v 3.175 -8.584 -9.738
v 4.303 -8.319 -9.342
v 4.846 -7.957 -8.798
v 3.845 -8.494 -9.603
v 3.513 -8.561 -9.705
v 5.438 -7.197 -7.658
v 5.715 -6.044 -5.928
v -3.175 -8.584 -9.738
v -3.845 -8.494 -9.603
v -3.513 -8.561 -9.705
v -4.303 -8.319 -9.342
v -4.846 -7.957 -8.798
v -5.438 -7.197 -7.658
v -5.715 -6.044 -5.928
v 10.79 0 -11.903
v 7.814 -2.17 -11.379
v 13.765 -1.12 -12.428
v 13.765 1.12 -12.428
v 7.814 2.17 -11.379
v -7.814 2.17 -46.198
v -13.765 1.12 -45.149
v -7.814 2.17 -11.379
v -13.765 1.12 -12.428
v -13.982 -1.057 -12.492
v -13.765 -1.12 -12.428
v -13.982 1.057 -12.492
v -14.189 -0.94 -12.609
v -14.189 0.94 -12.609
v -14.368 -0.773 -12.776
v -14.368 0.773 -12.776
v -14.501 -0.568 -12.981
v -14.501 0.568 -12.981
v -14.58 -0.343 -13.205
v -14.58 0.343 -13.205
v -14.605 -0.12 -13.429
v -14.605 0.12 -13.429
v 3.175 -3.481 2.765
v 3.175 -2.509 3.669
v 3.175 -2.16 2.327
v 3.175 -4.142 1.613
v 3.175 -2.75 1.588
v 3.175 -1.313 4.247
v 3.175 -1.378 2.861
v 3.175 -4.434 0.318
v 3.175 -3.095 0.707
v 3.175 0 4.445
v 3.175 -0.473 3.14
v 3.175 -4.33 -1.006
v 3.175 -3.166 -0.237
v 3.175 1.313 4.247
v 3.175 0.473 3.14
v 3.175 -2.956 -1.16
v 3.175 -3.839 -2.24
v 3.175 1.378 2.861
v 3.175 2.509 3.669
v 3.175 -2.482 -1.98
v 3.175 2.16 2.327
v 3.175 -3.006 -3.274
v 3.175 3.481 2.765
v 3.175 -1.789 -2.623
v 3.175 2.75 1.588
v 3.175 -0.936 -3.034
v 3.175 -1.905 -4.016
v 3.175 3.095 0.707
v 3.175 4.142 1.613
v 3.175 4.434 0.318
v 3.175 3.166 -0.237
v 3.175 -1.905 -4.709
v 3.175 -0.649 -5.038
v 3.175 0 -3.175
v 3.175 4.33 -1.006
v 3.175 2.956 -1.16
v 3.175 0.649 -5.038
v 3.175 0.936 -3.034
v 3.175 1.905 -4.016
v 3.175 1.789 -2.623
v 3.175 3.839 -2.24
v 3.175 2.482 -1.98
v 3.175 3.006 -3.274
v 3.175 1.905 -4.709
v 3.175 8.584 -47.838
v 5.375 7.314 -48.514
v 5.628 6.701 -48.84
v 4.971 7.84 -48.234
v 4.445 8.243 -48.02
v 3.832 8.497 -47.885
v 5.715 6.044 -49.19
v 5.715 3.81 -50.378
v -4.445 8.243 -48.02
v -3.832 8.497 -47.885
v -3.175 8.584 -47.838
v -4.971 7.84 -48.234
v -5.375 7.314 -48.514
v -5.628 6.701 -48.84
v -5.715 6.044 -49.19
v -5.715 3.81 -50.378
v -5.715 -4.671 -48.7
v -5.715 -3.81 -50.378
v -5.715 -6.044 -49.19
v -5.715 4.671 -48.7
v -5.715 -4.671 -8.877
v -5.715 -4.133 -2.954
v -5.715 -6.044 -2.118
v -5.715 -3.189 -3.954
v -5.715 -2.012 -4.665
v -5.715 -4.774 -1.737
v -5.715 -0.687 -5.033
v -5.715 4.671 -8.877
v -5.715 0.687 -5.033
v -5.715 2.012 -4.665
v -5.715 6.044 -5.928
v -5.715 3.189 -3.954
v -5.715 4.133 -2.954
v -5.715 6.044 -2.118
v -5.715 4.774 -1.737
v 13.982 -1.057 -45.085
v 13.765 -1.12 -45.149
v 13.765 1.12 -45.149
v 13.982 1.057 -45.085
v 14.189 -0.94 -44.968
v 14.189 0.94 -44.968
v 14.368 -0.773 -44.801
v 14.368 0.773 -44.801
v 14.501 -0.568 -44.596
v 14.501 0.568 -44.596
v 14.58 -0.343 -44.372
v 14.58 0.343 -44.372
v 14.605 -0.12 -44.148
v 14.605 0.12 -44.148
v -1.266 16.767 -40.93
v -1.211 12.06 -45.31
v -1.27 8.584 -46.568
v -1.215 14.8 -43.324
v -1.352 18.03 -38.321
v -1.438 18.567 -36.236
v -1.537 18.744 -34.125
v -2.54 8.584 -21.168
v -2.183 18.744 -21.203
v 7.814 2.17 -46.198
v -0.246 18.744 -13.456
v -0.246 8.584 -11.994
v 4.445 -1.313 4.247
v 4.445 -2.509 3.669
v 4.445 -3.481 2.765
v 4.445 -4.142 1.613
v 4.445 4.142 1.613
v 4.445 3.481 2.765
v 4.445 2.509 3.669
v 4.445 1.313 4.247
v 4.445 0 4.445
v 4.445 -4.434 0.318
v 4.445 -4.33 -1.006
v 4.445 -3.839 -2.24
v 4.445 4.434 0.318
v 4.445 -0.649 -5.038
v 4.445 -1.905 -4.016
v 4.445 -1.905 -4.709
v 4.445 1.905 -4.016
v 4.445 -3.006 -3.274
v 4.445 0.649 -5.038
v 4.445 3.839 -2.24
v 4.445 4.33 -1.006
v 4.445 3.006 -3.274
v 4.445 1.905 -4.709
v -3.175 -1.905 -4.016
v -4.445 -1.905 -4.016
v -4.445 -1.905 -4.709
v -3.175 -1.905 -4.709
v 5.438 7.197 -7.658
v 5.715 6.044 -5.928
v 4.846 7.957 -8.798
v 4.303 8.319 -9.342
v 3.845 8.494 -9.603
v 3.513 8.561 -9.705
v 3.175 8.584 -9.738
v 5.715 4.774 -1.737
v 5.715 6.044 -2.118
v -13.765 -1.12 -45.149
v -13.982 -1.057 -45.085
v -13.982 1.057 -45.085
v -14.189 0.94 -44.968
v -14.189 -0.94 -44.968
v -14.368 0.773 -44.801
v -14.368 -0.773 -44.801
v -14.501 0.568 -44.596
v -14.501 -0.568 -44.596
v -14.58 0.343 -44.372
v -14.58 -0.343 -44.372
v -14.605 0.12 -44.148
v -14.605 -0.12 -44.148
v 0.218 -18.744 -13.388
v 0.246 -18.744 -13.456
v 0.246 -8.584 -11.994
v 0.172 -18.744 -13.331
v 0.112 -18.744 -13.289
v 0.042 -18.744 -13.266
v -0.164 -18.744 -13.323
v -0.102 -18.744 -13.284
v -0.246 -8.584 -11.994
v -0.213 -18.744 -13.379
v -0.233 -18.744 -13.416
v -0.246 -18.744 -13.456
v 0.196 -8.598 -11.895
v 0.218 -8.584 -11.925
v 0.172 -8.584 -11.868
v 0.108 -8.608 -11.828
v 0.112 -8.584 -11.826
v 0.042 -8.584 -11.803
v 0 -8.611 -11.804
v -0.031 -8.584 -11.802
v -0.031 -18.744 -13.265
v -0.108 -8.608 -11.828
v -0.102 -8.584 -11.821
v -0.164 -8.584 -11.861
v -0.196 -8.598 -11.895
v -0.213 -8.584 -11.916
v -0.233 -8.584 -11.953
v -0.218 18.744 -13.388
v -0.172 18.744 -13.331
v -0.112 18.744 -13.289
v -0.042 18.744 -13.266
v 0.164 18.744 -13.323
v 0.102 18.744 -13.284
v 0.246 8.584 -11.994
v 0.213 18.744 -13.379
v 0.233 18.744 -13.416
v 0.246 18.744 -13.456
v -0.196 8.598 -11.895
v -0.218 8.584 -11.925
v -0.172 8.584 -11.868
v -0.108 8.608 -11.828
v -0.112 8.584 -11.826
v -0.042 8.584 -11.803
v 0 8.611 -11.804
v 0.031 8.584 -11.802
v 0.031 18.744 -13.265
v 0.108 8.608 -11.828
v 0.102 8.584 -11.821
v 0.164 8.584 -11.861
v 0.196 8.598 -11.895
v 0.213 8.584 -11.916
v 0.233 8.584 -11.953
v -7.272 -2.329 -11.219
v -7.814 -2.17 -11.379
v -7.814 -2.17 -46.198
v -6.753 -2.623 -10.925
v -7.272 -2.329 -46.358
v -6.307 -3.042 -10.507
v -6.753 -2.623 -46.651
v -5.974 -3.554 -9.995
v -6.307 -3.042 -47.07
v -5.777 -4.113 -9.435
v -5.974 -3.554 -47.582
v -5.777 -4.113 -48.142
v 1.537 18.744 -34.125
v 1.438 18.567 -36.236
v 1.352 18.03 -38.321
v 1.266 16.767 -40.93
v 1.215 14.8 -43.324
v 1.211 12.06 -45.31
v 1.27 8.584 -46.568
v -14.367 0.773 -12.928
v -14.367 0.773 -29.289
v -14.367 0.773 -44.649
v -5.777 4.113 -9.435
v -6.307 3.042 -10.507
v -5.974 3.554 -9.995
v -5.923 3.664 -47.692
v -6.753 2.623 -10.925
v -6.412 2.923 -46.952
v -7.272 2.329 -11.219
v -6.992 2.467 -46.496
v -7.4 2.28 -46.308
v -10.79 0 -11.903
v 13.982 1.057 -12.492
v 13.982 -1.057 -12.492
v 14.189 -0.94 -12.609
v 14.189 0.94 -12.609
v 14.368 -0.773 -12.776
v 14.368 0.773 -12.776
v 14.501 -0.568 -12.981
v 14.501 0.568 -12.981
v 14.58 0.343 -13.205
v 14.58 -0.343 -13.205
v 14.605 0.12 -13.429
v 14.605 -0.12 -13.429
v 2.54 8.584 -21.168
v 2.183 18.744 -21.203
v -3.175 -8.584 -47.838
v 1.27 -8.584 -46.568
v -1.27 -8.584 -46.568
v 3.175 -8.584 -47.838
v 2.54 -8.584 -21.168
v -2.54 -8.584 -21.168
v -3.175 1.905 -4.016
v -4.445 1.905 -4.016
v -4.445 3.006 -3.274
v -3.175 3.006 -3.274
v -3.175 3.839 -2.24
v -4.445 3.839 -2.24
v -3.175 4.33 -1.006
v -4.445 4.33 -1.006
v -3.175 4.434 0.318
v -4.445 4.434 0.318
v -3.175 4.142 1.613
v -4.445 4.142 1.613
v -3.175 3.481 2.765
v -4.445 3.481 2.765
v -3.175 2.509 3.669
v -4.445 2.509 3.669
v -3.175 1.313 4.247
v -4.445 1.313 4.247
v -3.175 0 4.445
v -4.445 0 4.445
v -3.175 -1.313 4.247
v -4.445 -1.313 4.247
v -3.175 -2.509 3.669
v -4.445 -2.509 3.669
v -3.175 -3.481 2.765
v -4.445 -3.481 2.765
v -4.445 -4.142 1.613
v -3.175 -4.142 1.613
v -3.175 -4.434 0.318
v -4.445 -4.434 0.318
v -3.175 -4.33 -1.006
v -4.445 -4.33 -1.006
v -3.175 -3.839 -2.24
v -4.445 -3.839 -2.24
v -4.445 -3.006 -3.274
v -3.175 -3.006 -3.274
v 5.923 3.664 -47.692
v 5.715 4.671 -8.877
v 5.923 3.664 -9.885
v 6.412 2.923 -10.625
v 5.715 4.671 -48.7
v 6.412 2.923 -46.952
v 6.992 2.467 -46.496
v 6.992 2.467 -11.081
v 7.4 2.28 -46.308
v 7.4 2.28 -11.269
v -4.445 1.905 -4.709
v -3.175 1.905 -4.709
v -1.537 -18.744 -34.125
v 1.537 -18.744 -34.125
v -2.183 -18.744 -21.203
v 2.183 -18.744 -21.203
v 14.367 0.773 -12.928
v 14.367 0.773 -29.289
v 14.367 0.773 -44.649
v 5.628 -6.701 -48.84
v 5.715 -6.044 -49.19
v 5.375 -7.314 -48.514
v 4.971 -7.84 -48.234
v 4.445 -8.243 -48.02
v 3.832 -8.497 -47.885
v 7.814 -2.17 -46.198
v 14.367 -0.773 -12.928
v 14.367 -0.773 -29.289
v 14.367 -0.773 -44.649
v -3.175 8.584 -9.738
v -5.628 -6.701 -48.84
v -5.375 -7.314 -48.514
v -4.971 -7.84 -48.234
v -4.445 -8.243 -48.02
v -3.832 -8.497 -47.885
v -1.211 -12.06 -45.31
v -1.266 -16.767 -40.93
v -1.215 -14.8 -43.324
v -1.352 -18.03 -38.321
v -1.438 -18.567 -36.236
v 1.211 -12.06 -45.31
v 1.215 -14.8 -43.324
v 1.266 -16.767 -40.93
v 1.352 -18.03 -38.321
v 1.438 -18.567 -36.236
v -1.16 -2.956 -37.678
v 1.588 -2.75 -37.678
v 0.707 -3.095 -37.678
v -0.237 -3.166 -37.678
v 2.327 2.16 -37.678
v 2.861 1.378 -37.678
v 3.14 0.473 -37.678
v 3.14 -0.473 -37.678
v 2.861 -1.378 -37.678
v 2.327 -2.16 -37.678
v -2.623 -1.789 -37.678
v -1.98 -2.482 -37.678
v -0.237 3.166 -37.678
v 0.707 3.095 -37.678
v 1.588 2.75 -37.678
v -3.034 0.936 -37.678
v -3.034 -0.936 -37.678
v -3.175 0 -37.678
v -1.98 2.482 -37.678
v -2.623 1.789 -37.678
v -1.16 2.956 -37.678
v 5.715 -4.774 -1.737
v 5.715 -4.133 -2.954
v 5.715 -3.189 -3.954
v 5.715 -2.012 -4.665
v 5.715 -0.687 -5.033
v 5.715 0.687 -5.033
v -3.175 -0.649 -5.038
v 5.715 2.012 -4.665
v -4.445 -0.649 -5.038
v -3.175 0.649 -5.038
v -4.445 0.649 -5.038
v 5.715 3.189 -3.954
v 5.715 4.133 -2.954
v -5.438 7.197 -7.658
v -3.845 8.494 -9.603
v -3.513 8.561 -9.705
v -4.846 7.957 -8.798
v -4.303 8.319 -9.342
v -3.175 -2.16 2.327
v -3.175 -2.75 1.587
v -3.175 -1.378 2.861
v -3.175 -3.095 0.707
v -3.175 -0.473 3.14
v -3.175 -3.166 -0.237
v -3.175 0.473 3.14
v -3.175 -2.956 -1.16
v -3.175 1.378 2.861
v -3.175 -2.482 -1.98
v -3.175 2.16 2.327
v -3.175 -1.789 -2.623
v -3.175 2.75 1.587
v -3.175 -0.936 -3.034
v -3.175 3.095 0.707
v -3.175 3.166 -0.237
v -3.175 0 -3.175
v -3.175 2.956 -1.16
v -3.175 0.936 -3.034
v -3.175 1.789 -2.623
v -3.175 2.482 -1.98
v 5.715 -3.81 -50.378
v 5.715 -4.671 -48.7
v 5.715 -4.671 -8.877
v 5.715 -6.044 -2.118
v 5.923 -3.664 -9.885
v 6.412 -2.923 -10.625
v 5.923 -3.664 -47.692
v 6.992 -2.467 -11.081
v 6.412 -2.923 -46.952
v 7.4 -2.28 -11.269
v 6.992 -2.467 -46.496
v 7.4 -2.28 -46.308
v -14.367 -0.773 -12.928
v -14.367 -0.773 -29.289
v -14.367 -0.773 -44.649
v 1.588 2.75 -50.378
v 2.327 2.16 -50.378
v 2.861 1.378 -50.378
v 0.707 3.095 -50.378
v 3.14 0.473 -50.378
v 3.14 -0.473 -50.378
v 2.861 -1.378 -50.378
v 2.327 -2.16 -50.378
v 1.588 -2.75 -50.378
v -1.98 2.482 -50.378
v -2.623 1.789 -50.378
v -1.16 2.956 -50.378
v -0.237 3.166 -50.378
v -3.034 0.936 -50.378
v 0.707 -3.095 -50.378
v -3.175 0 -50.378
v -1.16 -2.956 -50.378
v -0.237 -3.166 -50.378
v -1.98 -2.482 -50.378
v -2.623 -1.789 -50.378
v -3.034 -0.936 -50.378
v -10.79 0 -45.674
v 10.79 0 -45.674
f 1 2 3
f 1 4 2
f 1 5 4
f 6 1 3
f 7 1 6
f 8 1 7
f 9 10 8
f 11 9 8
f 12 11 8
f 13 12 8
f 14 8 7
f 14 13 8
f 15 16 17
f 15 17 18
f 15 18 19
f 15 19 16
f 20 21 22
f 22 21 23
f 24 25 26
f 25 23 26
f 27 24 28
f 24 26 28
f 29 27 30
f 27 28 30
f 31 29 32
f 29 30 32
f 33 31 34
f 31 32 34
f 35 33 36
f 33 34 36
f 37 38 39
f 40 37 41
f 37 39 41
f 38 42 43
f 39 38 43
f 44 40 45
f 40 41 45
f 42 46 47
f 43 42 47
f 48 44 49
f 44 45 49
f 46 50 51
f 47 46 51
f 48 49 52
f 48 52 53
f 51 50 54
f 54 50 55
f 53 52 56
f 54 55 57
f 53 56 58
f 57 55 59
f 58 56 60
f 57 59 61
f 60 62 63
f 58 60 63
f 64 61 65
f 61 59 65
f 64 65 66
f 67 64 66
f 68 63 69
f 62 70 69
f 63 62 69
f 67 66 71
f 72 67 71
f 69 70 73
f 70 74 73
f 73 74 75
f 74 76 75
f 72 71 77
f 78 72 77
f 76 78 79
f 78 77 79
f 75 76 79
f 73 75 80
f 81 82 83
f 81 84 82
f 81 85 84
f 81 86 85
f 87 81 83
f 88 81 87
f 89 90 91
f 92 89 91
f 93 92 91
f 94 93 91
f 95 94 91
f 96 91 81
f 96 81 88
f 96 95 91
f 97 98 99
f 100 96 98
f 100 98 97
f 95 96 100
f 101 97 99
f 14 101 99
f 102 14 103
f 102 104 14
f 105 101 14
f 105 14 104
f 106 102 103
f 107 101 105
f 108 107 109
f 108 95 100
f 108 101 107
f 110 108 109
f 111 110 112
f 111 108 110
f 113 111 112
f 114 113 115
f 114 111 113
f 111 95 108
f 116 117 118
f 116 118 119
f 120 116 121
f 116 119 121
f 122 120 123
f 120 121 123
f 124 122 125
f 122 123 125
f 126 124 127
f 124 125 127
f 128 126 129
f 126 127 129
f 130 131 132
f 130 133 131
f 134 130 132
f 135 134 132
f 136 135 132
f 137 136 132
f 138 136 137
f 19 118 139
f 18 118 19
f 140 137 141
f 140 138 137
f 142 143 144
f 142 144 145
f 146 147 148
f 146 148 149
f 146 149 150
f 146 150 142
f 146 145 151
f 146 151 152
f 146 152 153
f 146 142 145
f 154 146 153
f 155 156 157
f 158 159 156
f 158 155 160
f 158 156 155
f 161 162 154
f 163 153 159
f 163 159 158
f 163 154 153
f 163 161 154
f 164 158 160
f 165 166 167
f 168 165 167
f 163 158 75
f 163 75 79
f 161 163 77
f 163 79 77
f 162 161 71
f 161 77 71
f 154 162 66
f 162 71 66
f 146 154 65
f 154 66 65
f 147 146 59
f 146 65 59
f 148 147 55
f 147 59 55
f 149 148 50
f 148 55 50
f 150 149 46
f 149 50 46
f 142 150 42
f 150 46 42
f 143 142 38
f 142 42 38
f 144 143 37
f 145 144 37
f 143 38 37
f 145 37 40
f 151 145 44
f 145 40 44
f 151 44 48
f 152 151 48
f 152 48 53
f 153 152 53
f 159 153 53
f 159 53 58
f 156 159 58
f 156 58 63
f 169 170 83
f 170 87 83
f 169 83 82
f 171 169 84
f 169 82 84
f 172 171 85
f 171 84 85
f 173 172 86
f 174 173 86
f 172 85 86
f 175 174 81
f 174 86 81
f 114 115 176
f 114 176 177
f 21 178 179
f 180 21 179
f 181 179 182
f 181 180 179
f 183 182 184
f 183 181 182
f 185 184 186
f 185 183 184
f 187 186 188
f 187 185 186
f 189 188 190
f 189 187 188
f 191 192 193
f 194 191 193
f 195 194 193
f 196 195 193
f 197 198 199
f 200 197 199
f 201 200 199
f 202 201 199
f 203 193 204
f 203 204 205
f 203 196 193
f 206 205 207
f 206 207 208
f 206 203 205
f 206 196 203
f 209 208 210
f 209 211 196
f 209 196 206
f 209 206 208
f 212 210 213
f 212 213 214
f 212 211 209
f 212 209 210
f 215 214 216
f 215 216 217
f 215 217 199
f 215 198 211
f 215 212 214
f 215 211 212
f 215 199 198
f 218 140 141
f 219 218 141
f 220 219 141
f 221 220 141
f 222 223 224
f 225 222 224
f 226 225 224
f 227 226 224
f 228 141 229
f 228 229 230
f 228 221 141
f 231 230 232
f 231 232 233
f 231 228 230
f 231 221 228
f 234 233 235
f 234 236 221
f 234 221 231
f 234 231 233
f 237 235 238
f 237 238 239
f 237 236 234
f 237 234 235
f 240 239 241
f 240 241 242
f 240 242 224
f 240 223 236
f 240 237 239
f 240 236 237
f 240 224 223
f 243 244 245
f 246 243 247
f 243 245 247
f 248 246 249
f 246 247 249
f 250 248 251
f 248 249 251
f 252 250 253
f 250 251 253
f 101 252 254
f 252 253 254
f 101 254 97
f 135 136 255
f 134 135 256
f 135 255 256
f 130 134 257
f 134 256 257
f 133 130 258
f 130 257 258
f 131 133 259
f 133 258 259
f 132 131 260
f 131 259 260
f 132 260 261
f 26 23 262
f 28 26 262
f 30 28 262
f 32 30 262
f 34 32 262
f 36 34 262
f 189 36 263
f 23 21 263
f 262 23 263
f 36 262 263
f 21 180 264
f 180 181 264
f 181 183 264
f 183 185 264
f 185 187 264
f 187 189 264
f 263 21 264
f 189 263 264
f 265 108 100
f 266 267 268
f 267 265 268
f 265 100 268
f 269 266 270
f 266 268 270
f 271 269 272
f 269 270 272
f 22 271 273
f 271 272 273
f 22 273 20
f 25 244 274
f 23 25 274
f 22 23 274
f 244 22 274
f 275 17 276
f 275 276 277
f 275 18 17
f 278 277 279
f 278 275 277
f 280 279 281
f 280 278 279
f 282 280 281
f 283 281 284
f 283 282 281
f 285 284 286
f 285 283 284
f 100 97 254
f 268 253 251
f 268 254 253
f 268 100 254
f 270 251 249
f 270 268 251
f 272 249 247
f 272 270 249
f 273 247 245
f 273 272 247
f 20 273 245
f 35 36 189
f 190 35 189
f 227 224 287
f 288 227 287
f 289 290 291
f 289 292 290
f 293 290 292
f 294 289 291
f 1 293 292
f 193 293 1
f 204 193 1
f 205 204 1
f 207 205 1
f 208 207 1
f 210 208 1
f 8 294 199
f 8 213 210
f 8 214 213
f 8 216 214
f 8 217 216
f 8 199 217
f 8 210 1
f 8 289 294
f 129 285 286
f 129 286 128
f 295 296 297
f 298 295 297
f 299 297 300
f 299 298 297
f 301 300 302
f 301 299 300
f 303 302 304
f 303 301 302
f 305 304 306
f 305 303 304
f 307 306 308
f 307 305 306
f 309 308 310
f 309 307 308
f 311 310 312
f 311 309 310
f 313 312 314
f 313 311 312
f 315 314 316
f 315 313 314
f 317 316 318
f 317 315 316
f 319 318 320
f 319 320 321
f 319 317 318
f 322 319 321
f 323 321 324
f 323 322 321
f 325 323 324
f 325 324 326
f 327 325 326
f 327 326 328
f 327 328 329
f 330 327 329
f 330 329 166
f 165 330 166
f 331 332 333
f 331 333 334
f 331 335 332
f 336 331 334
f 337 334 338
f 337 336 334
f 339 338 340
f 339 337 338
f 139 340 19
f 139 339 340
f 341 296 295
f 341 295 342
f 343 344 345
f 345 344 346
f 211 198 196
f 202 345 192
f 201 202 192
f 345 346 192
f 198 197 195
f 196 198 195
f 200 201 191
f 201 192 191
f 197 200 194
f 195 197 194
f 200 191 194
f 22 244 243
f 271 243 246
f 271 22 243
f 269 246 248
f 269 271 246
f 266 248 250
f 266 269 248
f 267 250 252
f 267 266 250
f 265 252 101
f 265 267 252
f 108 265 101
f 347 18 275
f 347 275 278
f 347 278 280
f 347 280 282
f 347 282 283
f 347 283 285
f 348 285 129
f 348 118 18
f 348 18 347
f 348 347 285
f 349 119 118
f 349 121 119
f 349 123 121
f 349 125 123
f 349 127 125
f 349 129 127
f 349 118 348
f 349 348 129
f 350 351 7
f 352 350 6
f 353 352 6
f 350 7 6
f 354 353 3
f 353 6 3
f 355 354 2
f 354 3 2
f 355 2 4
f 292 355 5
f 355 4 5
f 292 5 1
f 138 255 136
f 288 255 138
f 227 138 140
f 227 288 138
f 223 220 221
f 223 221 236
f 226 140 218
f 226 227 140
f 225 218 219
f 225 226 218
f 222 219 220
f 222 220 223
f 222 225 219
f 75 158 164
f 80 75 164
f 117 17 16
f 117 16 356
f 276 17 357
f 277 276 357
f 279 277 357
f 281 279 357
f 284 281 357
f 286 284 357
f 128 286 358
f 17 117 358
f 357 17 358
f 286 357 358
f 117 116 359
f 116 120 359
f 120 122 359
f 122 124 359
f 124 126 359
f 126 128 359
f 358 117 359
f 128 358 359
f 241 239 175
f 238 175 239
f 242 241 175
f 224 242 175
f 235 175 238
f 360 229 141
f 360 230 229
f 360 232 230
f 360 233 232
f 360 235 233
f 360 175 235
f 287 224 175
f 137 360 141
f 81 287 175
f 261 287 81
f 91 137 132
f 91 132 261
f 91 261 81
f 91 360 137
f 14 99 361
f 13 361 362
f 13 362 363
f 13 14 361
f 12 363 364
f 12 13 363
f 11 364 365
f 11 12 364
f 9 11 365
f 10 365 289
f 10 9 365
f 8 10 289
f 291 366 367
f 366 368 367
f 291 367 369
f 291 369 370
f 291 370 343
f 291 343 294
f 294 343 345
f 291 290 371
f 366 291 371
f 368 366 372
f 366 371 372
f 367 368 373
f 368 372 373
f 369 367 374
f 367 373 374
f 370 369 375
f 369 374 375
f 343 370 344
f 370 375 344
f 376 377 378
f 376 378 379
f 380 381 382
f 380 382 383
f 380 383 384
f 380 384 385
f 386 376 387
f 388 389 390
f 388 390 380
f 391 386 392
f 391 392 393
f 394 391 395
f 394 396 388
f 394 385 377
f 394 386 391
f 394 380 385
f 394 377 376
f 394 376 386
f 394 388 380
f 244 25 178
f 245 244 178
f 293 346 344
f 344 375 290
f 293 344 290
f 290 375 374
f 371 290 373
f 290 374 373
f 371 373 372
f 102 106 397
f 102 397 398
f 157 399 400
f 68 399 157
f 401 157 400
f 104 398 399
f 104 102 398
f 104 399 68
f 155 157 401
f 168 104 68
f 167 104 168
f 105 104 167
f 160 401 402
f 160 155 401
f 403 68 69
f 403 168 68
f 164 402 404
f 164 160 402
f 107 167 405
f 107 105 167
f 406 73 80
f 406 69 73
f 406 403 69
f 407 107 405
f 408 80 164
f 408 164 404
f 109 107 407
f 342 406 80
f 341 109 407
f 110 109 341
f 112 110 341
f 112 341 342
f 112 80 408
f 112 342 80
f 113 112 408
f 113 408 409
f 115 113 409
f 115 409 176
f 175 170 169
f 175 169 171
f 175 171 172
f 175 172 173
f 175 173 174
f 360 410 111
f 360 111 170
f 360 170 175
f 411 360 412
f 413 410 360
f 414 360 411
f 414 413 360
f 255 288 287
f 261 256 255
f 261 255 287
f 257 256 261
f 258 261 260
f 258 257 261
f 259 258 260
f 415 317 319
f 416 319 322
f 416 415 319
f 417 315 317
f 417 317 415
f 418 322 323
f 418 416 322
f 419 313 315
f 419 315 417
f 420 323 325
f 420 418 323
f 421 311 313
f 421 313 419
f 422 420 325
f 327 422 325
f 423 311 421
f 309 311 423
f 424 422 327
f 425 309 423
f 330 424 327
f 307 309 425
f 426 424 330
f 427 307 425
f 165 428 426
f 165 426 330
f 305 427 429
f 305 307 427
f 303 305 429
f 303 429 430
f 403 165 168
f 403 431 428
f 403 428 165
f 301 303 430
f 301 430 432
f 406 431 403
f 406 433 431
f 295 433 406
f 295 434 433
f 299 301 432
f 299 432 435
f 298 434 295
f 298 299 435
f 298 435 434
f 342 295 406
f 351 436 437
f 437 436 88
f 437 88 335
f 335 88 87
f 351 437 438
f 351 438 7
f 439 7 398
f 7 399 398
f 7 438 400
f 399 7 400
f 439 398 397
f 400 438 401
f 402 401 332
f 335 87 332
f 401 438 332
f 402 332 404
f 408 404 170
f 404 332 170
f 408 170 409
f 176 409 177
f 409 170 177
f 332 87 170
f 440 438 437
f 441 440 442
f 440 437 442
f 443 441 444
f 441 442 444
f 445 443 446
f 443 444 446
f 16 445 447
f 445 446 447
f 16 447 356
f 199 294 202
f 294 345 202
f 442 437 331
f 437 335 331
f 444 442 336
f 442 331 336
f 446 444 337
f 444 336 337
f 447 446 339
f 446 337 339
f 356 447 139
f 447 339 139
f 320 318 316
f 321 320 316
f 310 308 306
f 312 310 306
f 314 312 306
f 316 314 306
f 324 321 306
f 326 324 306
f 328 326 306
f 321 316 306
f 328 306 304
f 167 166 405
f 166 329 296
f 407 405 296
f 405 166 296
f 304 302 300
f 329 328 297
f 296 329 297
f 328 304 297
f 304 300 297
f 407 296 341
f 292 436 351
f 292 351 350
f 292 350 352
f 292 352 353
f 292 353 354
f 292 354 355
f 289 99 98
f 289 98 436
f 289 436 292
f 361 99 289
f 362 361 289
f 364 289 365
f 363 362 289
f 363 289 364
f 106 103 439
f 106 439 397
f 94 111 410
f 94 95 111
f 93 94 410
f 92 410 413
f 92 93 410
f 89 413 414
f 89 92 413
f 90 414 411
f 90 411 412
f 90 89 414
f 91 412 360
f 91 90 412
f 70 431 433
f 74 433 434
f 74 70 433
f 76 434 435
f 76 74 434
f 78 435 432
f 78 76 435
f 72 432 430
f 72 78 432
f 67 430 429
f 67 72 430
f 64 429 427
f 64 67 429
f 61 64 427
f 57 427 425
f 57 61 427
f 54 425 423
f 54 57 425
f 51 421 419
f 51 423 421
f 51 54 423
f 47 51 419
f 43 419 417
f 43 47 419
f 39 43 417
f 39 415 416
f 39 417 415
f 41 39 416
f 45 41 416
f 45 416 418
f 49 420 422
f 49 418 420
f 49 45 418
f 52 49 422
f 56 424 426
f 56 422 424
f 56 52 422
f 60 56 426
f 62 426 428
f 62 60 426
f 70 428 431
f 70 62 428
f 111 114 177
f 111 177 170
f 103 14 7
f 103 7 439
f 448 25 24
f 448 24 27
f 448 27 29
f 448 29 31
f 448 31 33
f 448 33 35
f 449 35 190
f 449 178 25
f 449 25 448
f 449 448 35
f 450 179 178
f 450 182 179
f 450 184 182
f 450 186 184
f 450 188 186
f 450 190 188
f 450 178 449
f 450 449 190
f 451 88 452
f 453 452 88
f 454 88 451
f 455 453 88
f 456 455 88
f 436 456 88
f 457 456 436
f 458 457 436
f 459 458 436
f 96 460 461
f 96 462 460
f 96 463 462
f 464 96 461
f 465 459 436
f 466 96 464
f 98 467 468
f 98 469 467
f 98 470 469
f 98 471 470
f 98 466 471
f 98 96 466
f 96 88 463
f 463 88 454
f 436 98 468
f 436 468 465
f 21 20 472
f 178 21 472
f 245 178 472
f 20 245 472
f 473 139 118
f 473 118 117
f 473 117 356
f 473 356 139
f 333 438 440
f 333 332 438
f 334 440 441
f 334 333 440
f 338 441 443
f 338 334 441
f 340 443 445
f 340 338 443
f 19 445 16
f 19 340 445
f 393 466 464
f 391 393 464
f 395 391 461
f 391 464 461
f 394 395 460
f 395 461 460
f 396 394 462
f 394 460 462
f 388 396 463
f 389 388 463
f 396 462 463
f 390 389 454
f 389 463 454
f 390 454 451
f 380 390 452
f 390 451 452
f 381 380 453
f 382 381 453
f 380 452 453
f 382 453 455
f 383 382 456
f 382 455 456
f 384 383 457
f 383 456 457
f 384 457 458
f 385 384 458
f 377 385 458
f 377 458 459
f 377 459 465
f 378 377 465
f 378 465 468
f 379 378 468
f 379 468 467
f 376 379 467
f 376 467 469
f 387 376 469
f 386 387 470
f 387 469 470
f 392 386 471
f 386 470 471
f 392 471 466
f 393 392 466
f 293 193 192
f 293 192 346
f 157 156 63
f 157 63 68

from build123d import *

# Parameters (mm, degrees)
SKETCH1_R                = 3.175
BOSS_EXTRUDE1_DEPTH      = 3.175
SKETCH2_R                = 4.445
BOSS_EXTRUDE2_DEPTH      = 1.27
SKETCH3_W                = 6.35
SKETCH3_H                = 3.81
BOSS_EXTRUDE3_DEPTH      = 1.27
BOSS_EXTRUDE4_DEPTH      = 8.89
BOSS_EXTRUDE4_DEPTH_BACK = 2.54
SKETCH5_R                = 3.175
CUT_EXTRUDE1_DEPTH       = 12.7
FILLET1_R                = 2.54
SKETCH6_W                = 35.56
SKETCH6_H                = 5.08
BOSS_EXTRUDE5_DEPTH      = 8.89
BOSS_EXTRUDE5_TAPER      = 10
FILLET2_R                = 1.016
FILLET3_R                = 2.54
BOSS_EXTRUDE6_DEPTH      = 10.16
BOSS_EXTRUDE6_TAPER      = 2
FILLET4_R                = 0.254
FILLET5_R                = 12.7


with BuildPart() as part:
    # Sketch1 → Boss-Extrude1 (new, symmetric)
    with BuildSketch(Plane(origin=(0, 0, 0), x_dir=(0, 0, -1), z_dir=(1, 0, 0))):
        Circle(SKETCH1_R)
    extrude(amount=BOSS_EXTRUDE1_DEPTH, both=True)

    # Sketch2 → Boss-Extrude2 (add)
    with BuildSketch(Plane(origin=(3.175, 0, 0), x_dir=(0, 0, -1), z_dir=(1, 0, 0))):
        Circle(SKETCH2_R)
    boss_extrude2 = extrude(amount=BOSS_EXTRUDE2_DEPTH)

    # Mirror1: Boss-Extrude2 across plane
    add(boss_extrude2.mirror(Plane(origin=(0, 0, 0), x_dir=(0, 0, 1), z_dir=(1, 0, 0))))

    # Sketch3 → Boss-Extrude3 (add)
    with BuildSketch(Plane(origin=(4.445, 0, 0), x_dir=(0, 0, -1), z_dir=(1, 0, 0))):
        with Locations((3.175, 0)):
            Rectangle(SKETCH3_W, SKETCH3_H)
    boss_extrude3 = extrude(amount=-BOSS_EXTRUDE3_DEPTH)

    # Mirror2: Boss-Extrude3 across plane
    add(boss_extrude3.mirror(Plane(origin=(0, 0, 0), x_dir=(0, 0, 1), z_dir=(1, 0, 0))))

    # Sketch4 → Boss-Extrude4 (add, two sides: drawn at the far end of the back side and taken through both)
    with BuildSketch(Plane(origin=(-3.175, 0, 0), x_dir=(0, 0, -1), z_dir=(1, 0, 0)).offset(-BOSS_EXTRUDE4_DEPTH_BACK)):
        with BuildLine():
            Line((1.737462328, 4.773638514), (2.118462328, 6.043638514))
            Line((2.118462328, 6.043638514), (5.928462328, 6.043638514))
            Line((5.928462328, 6.043638514), (9.738462328, 8.583638514))
            Line((9.738462328, 8.583638514), (47.838462328, 8.583638514))
            Line((47.838462328, 8.583638514), (50.378462328, 3.81))
            Line((50.378462328, 3.81), (50.378462328, -3.81))
            Line((50.378462328, -3.81), (47.838462328, -8.583638514))
            Line((47.838462328, -8.583638514), (9.738462328, -8.583638514))
            Line((9.738462328, -8.583638514), (5.928462328, -6.043638514))
            Line((5.928462328, -6.043638514), (2.118462328, -6.043638514))
            Line((2.118462328, -6.043638514), (1.737462328, -4.773638514))
            ThreePointArc((1.737462328, -4.773638514), (5.08, 0), (1.737462328, 4.773638514))
        make_face()
    extrude(amount=BOSS_EXTRUDE4_DEPTH + BOSS_EXTRUDE4_DEPTH_BACK)

    # Sketch5 → Cut-Extrude1 (cut)
    with BuildSketch(Plane(origin=(0, 0, -50.378462328), x_dir=(-1, 0, 0), z_dir=(0, 0, -1))):
        Circle(SKETCH5_R)
    extrude(amount=-CUT_EXTRUDE1_DEPTH, mode=Mode.SUBTRACT)

    # Fillet1
    fillet1_edges = [part.edges().sort_by_distance(p)[0] for p in [
        (5.715, -8.583638514, -28.788462328),
        (-5.715, -8.583638514, -28.788462328),
        (-5.715, 8.583638514, -28.788462328),
        (5.715, 8.583638514, -28.788462328),
    ]]
    fillet(fillet1_edges, radius=FILLET1_R)

    # Sketch6 → Boss-Extrude5 (add)
    with BuildSketch(Plane(origin=(5.715, 0, 0), x_dir=(0, 0, -1), z_dir=(1, 0, 0))):
        with Locations((28.788462328, 0)):
            Rectangle(SKETCH6_W, SKETCH6_H)
    boss_extrude5 = extrude(amount=BOSS_EXTRUDE5_DEPTH, taper=BOSS_EXTRUDE5_TAPER)

    # Mirror3: Boss-Extrude5 across plane
    add(boss_extrude5.mirror(Plane(origin=(0, 0, 0), x_dir=(0, 0, 1), z_dir=(1, 0, 0))))

    # Fillet2
    fillet2_edges = [part.edges().sort_by_distance(p)[0] for p in [
        (14.605, 0, -12.576009187),
        (14.605, -0.972453142, -28.788462328),
        (14.605, 0, -45.00091547),
        (14.605, 0.972453142, -28.788462328),
        (-14.605, 0, -12.576009187),
        (-14.605, 0.972453142, -28.788462328),
        (-14.605, 0, -45.00091547),
        (-14.605, -0.972453142, -28.788462328),
    ]]
    fillet(fillet2_edges, radius=FILLET2_R)

    # Fillet3
    fillet3_edges = [part.edges().sort_by_distance(p)[0] for p in [
        (5.715, 0, -11.008462328),
        (5.715, -2.54, -28.788462328),
        (5.715, 0, -46.568462328),
        (5.715, 2.54, -28.788462328),
        (-5.715, 0, -11.008462328),
        (-5.715, -2.54, -28.788462328),
        (-5.715, 0, -46.568462328),
        (-5.715, 2.54, -28.788462328),
    ]]
    fillet(fillet3_edges, radius=FILLET3_R)

    # Sketch7 → Boss-Extrude6 (add)
    with BuildSketch(Plane(origin=(0, 8.583638514, 0), x_dir=(1, 0, 0), z_dir=(0, 1, 0))):
        Polygon((-1.27, 46.568462328), (-2.54, 21.168462328), (0, 11.008462328), (2.54, 21.168462328), (1.27, 46.568462328), align=None)
    boss_extrude6 = extrude(amount=BOSS_EXTRUDE6_DEPTH, taper=BOSS_EXTRUDE6_TAPER)

    # Mirror4: Boss-Extrude6 across plane
    add(boss_extrude6.mirror(Plane.ZX))

    # Fillet4
    fillet4_edges = [part.edges().sort_by_distance(p)[0] for p in [
        (0, 13.663638514, -11.739890995),
        (0, -13.663638514, -11.739890995),
    ]]
    fillet(fillet4_edges, radius=FILLET4_R)

    # Fillet5
    # the kernel refuses this fillet: 12.7 mm, written as the material it takes off along each edge
    with BuildSketch(Plane(origin=(31.154033704, -18.743638514, -46.21366731), x_dir=(0, 0.9993908270191081, -0.034899496702148744), z_dir=(-1, 0, 0))) as fillet5_piece_1:
        with BuildLine():
            CenterArc((12.270376998, -12.524472427), FILLET5_R, 99.536959033, 78.463040967)
            Line((-0.421886505, -12.081248819), (-0.675731775, -12.072384347))
            Line((-0.675731775, -12.072384347), (-0.25384527, 0.008864472))
            Line((-0.25384527, 0.008864472), (0, 0.254))
            ThreePointArc((0, 0.254), (5.083096485, 0.254), (10.12410929, 0.250489449))
            Line((10.12410929, 0.250489449), (10.16619297, 0))
        make_face()
    extrude(amount=62.308067408, mode=Mode.SUBTRACT)
    with BuildSketch(Plane(origin=(31.154033704, 18.743638514, -46.21366731), x_dir=(0, -0.9993908270191081, -0.034899496702148744), z_dir=(-1, 0, 0))) as fillet5_piece_2:
        with BuildLine():
            CenterArc((12.270376998, 12.524472427), FILLET5_R, 182, 78.463040967)
            Line((-0.421886505, 12.081248819), (-0.675731775, 12.072384347))
            Line((-0.675731775, 12.072384347), (-0.25384527, -0.008864472))
            Line((-0.25384527, -0.008864472), (0, -0.254))
            ThreePointArc((0, -0.254), (5.083096485, -0.254), (10.12410929, -0.250489449))
            Line((10.12410929, -0.250489449), (10.16619297, 0))
        make_face()
    extrude(amount=62.308067408, mode=Mode.SUBTRACT)


solid = part.part
